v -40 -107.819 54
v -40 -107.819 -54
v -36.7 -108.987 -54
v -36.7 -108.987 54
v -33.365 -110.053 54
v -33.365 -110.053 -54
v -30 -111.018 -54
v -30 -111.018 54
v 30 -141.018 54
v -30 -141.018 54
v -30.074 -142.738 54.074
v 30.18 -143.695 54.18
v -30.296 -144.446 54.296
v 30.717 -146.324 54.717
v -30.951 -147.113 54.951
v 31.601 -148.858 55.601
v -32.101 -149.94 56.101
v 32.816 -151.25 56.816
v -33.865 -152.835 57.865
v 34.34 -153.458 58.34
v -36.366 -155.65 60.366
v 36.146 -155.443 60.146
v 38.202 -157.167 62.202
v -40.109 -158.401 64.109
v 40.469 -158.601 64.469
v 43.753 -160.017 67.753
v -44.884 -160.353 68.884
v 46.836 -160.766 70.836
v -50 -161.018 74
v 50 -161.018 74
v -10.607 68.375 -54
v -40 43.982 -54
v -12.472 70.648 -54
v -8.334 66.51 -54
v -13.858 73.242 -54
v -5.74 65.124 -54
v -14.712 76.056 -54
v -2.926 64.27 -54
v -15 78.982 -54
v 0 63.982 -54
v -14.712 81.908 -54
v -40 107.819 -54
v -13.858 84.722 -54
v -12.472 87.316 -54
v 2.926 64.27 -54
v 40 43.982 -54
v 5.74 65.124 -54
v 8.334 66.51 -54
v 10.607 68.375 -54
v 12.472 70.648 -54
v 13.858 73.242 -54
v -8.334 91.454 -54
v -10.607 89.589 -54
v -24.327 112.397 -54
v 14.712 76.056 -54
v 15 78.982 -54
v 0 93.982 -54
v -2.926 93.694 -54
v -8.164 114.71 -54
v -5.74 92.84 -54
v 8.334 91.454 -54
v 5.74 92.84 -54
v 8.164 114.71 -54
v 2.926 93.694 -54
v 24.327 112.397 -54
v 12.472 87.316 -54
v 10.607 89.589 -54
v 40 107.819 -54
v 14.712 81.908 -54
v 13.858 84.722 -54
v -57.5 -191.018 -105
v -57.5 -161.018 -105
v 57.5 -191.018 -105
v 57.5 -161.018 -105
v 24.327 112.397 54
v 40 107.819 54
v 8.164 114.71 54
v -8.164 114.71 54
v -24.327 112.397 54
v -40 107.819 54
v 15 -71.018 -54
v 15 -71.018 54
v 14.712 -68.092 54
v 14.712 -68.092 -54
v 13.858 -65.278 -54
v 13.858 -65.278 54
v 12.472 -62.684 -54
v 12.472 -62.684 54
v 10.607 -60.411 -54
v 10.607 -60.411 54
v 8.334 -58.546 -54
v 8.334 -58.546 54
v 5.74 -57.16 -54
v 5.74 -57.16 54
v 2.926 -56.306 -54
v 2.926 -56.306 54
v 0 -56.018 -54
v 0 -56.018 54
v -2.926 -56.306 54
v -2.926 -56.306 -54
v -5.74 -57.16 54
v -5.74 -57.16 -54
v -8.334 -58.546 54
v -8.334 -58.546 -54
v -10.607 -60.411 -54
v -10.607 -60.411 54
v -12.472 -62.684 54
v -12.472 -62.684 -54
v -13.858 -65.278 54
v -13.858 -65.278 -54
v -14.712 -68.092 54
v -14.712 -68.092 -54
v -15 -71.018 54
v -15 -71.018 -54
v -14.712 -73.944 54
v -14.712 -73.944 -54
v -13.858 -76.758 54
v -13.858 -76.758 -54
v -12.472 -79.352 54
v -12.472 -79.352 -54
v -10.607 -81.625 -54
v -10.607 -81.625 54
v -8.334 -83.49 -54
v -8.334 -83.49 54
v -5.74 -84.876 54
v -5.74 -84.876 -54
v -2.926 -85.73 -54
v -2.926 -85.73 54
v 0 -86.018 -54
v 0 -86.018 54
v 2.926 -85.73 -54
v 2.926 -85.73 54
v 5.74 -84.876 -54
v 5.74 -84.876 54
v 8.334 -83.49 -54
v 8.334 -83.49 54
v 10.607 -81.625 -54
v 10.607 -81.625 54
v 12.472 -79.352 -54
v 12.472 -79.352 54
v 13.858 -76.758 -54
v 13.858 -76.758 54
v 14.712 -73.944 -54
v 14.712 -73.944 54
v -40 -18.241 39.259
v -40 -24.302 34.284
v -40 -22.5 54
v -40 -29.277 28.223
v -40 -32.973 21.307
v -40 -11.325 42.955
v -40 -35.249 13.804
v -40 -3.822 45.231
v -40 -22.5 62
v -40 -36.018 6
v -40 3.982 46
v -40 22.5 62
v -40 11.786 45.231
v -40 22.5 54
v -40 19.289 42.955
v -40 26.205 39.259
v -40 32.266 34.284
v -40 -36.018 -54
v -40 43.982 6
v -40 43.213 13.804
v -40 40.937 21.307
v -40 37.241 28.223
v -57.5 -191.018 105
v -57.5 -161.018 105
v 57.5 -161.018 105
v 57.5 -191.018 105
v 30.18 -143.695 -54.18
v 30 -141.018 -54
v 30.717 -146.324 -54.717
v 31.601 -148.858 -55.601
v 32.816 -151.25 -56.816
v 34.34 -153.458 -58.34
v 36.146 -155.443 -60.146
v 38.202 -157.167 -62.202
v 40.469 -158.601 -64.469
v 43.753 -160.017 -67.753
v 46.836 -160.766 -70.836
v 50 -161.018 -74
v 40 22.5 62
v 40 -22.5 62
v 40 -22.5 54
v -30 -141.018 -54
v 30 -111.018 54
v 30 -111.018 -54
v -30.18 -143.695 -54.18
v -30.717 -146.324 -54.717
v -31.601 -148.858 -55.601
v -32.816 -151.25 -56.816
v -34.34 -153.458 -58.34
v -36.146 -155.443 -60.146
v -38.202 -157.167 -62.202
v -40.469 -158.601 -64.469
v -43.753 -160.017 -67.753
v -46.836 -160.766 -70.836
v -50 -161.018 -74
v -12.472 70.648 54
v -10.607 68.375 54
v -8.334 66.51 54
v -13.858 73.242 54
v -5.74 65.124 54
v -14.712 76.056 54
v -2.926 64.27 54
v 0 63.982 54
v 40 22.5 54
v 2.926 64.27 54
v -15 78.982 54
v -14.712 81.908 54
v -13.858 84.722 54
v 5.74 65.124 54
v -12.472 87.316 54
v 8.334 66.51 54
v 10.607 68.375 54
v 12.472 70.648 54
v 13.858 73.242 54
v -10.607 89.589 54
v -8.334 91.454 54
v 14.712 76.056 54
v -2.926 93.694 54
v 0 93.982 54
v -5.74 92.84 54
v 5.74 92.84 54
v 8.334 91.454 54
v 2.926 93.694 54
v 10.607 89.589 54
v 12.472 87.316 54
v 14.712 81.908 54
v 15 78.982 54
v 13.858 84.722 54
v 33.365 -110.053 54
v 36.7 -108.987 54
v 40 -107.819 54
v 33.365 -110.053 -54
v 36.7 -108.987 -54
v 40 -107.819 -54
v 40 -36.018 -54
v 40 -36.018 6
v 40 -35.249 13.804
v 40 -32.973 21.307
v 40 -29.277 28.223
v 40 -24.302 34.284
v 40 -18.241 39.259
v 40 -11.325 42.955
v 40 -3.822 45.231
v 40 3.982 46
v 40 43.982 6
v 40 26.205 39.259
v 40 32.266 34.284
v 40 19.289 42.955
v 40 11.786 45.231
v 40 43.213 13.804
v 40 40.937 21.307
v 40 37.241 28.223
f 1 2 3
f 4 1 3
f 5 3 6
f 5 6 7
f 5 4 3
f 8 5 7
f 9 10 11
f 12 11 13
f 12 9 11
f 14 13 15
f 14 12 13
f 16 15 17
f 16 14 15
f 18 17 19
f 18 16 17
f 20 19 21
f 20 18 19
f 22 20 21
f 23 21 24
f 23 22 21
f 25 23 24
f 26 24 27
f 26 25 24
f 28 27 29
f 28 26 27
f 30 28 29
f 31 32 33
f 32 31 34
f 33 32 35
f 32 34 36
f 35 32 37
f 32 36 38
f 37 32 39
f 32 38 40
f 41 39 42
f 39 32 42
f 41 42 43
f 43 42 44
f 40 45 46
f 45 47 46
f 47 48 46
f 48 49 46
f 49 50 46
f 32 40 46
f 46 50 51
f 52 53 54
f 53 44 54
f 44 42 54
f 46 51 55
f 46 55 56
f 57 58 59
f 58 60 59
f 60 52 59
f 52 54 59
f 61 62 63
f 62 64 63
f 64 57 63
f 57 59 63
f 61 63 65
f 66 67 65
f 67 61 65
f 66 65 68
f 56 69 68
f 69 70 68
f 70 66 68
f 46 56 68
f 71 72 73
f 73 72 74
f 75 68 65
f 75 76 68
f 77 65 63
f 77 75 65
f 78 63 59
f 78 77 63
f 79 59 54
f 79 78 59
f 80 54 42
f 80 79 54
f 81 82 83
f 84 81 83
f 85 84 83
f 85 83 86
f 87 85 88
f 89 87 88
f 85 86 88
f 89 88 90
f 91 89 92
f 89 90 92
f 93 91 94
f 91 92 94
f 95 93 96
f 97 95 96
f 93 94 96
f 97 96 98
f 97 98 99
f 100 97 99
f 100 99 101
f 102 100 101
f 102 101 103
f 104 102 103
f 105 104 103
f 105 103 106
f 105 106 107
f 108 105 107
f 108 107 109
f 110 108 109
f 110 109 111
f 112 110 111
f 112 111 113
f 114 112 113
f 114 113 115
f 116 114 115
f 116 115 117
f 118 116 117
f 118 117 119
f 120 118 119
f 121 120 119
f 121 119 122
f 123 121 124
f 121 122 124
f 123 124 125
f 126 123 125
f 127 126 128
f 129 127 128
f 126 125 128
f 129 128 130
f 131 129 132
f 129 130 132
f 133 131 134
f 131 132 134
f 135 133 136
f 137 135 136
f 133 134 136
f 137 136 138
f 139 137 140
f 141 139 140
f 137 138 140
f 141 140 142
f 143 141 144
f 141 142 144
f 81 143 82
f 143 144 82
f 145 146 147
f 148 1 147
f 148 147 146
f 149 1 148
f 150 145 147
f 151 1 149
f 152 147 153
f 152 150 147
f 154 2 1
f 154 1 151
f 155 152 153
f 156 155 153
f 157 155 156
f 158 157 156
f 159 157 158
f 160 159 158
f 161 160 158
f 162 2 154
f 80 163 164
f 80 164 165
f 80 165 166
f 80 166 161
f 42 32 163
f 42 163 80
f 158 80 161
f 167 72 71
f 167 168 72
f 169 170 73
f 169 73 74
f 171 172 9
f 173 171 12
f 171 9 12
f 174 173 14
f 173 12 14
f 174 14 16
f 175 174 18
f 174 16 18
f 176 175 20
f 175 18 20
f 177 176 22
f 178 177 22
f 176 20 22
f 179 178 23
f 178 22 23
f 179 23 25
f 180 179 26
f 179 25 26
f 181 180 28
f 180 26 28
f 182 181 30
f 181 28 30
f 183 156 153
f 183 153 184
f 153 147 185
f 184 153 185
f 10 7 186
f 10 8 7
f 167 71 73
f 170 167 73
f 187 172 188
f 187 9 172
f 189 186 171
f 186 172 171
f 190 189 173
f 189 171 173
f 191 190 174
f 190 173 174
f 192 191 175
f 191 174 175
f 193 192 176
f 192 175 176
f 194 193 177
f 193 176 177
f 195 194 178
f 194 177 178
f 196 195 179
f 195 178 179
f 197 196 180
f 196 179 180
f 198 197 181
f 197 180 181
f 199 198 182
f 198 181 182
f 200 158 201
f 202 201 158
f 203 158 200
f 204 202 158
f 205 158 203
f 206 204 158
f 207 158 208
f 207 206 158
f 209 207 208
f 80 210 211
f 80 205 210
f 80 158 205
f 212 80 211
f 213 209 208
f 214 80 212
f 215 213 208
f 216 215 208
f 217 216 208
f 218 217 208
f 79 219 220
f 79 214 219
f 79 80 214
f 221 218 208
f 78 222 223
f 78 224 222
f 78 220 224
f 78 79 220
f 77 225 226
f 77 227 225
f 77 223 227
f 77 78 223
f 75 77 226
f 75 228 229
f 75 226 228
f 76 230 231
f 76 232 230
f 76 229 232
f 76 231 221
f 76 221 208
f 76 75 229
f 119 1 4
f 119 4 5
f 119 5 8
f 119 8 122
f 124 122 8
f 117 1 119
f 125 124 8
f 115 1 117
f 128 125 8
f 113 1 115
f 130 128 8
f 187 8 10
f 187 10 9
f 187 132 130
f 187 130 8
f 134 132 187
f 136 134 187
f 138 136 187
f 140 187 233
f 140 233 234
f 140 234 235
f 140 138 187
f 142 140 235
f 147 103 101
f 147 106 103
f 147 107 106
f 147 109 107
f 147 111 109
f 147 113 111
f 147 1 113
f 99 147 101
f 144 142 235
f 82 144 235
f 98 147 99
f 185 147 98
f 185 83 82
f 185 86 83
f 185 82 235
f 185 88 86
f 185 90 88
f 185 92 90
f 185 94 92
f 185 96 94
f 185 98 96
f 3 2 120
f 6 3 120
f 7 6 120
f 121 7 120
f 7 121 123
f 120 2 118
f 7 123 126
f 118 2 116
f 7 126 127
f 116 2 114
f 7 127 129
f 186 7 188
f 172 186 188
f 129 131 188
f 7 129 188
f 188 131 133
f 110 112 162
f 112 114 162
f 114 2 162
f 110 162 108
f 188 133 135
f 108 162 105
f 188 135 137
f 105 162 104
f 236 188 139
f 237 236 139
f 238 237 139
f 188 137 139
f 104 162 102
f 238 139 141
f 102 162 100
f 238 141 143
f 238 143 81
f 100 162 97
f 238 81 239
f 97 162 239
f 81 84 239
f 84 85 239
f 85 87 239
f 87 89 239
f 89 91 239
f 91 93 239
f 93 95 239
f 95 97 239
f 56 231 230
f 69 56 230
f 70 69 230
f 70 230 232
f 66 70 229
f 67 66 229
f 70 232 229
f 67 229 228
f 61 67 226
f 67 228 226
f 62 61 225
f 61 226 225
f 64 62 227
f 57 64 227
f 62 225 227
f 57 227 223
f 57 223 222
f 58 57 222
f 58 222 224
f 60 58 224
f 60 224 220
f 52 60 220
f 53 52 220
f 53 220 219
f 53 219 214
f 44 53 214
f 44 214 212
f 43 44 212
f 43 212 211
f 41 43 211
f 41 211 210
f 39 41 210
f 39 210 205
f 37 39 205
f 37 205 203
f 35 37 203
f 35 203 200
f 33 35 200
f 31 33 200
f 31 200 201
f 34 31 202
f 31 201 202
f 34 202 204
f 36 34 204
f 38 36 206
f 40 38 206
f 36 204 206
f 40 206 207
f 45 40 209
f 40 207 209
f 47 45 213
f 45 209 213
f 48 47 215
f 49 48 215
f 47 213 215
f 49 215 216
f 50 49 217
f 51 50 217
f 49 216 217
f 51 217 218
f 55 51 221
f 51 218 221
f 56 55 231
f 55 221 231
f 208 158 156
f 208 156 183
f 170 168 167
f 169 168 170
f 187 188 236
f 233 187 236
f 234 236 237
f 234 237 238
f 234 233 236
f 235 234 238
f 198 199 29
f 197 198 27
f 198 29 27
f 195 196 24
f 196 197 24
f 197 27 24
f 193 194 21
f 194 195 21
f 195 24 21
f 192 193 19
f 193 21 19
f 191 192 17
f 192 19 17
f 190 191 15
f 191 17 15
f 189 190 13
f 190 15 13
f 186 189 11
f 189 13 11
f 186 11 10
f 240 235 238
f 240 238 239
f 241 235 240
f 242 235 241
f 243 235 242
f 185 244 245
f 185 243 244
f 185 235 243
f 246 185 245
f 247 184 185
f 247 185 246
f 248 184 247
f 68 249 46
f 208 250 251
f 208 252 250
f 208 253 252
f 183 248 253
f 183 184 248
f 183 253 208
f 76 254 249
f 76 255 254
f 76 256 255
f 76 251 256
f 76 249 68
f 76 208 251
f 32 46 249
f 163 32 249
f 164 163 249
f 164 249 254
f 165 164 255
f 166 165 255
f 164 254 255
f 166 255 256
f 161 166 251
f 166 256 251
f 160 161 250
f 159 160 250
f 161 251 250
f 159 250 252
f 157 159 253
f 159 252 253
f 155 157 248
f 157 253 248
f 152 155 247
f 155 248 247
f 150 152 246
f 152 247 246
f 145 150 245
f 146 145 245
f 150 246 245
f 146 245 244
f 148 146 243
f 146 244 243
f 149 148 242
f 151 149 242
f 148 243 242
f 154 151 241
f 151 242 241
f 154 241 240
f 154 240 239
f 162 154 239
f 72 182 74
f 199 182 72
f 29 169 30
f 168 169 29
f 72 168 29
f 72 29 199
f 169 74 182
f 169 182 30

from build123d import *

# Parameters (mm, degrees)
BOSS_EXTRUDE2_DEPTH     = 105
BOSS_EXTRUDE3_DEPTH     = 54
SKETCH3_4_W             = 80
SKETCH3_4_H             = 45
BOSS_EXTRUDE4_DEPTH     = 62
CUT_EXTRUDE1_DEPTH      = 18.5
CUT_EXTRUDE1_DEPTH_BACK = 98.5
FILLET1_R               = 20
SKETCH7_R               = 15
CUT_EXTRUDE2_DEPTH      = 160


with BuildPart() as part:
    # Sketch3 → Boss-Extrude2 (new body, symmetric)
    with BuildSketch(Plane.XY):
        Polygon((30, -161.018016556), (-30, -161.018016556), (-57.5, -161.018016556), (-57.5, -191.018016556), (57.5, -191.018016556), (57.5, -161.018016556), align=None)
    extrude(amount=BOSS_EXTRUDE2_DEPTH, both=True)

    # Sketch3<3> → Boss-Extrude3 (add, symmetric)
    with BuildSketch(Plane.XY):
        with BuildLine():
            Line((-40, 107.819293264), (-40, -107.819293264))
            ThreePointArc((-40, -107.819293264), (-35.036523196, -109.532835453), (-30, -111.018016556))
            Line((-30, -111.018016556), (-30, -161.018016556))
            Line((-30, -161.018016556), (30, -161.018016556))
            Line((30, -161.018016556), (30, -111.018016556))
            ThreePointArc((30, -111.018016556), (35.036523196, -109.532835453), (40, -107.819293264))
            Line((40, -107.819293264), (40, 107.819293264))
            ThreePointArc((40, 107.819293264), (0, 115), (-40, 107.819293264))
        make_face()
    extrude(amount=BOSS_EXTRUDE3_DEPTH, both=True)

    # Sketch3<4> → Boss-Extrude4 (add)
    with BuildSketch(Plane.XY):
        Rectangle(SKETCH3_4_W, SKETCH3_4_H)
    extrude(amount=BOSS_EXTRUDE4_DEPTH)

    # Sketch5 → Cut-Extrude1 (cut, two sides)
    with BuildSketch(Plane(origin=(40, 0, 0), x_dir=(0, 0, -1), z_dir=(1, 0, 0))) as cut_extrude1_sk:
        with BuildLine():
            Line((54, 43.981983444), (-6, 43.981983444))
            ThreePointArc((-6, 43.981983444), (-46, 3.981983444), (-6, -36.018016556))
            Line((-6, -36.018016556), (54, -36.018016556))
            Line((54, -36.018016556), (54, 43.981983444))
        make_face()
    extrude(amount=CUT_EXTRUDE1_DEPTH, mode=Mode.SUBTRACT)
    extrude(cut_extrude1_sk.sketch, amount=-CUT_EXTRUDE1_DEPTH_BACK, mode=Mode.SUBTRACT)

    # Fillet1
    fillet1_edges = [part.edges().sort_by_distance(p)[0] for p in [
        (0, -161.018016556, -54),
        (-30, -161.018016556, 0),
        (30, -161.018016556, 0),
        (0, -161.018016556, 54),
    ]]
    fillet(fillet1_edges, radius=FILLET1_R)

    # Sketch7 → Cut-Extrude2 (cut, through all)
    with BuildSketch(Plane.XY.offset(54)):
        with Locations((0, -71.018016556)):
            Circle(SKETCH7_R)
        with Locations((0, 78.981983444)):
            Circle(SKETCH7_R)
    extrude(amount=-CUT_EXTRUDE2_DEPTH, mode=Mode.SUBTRACT)


solid = part.part
